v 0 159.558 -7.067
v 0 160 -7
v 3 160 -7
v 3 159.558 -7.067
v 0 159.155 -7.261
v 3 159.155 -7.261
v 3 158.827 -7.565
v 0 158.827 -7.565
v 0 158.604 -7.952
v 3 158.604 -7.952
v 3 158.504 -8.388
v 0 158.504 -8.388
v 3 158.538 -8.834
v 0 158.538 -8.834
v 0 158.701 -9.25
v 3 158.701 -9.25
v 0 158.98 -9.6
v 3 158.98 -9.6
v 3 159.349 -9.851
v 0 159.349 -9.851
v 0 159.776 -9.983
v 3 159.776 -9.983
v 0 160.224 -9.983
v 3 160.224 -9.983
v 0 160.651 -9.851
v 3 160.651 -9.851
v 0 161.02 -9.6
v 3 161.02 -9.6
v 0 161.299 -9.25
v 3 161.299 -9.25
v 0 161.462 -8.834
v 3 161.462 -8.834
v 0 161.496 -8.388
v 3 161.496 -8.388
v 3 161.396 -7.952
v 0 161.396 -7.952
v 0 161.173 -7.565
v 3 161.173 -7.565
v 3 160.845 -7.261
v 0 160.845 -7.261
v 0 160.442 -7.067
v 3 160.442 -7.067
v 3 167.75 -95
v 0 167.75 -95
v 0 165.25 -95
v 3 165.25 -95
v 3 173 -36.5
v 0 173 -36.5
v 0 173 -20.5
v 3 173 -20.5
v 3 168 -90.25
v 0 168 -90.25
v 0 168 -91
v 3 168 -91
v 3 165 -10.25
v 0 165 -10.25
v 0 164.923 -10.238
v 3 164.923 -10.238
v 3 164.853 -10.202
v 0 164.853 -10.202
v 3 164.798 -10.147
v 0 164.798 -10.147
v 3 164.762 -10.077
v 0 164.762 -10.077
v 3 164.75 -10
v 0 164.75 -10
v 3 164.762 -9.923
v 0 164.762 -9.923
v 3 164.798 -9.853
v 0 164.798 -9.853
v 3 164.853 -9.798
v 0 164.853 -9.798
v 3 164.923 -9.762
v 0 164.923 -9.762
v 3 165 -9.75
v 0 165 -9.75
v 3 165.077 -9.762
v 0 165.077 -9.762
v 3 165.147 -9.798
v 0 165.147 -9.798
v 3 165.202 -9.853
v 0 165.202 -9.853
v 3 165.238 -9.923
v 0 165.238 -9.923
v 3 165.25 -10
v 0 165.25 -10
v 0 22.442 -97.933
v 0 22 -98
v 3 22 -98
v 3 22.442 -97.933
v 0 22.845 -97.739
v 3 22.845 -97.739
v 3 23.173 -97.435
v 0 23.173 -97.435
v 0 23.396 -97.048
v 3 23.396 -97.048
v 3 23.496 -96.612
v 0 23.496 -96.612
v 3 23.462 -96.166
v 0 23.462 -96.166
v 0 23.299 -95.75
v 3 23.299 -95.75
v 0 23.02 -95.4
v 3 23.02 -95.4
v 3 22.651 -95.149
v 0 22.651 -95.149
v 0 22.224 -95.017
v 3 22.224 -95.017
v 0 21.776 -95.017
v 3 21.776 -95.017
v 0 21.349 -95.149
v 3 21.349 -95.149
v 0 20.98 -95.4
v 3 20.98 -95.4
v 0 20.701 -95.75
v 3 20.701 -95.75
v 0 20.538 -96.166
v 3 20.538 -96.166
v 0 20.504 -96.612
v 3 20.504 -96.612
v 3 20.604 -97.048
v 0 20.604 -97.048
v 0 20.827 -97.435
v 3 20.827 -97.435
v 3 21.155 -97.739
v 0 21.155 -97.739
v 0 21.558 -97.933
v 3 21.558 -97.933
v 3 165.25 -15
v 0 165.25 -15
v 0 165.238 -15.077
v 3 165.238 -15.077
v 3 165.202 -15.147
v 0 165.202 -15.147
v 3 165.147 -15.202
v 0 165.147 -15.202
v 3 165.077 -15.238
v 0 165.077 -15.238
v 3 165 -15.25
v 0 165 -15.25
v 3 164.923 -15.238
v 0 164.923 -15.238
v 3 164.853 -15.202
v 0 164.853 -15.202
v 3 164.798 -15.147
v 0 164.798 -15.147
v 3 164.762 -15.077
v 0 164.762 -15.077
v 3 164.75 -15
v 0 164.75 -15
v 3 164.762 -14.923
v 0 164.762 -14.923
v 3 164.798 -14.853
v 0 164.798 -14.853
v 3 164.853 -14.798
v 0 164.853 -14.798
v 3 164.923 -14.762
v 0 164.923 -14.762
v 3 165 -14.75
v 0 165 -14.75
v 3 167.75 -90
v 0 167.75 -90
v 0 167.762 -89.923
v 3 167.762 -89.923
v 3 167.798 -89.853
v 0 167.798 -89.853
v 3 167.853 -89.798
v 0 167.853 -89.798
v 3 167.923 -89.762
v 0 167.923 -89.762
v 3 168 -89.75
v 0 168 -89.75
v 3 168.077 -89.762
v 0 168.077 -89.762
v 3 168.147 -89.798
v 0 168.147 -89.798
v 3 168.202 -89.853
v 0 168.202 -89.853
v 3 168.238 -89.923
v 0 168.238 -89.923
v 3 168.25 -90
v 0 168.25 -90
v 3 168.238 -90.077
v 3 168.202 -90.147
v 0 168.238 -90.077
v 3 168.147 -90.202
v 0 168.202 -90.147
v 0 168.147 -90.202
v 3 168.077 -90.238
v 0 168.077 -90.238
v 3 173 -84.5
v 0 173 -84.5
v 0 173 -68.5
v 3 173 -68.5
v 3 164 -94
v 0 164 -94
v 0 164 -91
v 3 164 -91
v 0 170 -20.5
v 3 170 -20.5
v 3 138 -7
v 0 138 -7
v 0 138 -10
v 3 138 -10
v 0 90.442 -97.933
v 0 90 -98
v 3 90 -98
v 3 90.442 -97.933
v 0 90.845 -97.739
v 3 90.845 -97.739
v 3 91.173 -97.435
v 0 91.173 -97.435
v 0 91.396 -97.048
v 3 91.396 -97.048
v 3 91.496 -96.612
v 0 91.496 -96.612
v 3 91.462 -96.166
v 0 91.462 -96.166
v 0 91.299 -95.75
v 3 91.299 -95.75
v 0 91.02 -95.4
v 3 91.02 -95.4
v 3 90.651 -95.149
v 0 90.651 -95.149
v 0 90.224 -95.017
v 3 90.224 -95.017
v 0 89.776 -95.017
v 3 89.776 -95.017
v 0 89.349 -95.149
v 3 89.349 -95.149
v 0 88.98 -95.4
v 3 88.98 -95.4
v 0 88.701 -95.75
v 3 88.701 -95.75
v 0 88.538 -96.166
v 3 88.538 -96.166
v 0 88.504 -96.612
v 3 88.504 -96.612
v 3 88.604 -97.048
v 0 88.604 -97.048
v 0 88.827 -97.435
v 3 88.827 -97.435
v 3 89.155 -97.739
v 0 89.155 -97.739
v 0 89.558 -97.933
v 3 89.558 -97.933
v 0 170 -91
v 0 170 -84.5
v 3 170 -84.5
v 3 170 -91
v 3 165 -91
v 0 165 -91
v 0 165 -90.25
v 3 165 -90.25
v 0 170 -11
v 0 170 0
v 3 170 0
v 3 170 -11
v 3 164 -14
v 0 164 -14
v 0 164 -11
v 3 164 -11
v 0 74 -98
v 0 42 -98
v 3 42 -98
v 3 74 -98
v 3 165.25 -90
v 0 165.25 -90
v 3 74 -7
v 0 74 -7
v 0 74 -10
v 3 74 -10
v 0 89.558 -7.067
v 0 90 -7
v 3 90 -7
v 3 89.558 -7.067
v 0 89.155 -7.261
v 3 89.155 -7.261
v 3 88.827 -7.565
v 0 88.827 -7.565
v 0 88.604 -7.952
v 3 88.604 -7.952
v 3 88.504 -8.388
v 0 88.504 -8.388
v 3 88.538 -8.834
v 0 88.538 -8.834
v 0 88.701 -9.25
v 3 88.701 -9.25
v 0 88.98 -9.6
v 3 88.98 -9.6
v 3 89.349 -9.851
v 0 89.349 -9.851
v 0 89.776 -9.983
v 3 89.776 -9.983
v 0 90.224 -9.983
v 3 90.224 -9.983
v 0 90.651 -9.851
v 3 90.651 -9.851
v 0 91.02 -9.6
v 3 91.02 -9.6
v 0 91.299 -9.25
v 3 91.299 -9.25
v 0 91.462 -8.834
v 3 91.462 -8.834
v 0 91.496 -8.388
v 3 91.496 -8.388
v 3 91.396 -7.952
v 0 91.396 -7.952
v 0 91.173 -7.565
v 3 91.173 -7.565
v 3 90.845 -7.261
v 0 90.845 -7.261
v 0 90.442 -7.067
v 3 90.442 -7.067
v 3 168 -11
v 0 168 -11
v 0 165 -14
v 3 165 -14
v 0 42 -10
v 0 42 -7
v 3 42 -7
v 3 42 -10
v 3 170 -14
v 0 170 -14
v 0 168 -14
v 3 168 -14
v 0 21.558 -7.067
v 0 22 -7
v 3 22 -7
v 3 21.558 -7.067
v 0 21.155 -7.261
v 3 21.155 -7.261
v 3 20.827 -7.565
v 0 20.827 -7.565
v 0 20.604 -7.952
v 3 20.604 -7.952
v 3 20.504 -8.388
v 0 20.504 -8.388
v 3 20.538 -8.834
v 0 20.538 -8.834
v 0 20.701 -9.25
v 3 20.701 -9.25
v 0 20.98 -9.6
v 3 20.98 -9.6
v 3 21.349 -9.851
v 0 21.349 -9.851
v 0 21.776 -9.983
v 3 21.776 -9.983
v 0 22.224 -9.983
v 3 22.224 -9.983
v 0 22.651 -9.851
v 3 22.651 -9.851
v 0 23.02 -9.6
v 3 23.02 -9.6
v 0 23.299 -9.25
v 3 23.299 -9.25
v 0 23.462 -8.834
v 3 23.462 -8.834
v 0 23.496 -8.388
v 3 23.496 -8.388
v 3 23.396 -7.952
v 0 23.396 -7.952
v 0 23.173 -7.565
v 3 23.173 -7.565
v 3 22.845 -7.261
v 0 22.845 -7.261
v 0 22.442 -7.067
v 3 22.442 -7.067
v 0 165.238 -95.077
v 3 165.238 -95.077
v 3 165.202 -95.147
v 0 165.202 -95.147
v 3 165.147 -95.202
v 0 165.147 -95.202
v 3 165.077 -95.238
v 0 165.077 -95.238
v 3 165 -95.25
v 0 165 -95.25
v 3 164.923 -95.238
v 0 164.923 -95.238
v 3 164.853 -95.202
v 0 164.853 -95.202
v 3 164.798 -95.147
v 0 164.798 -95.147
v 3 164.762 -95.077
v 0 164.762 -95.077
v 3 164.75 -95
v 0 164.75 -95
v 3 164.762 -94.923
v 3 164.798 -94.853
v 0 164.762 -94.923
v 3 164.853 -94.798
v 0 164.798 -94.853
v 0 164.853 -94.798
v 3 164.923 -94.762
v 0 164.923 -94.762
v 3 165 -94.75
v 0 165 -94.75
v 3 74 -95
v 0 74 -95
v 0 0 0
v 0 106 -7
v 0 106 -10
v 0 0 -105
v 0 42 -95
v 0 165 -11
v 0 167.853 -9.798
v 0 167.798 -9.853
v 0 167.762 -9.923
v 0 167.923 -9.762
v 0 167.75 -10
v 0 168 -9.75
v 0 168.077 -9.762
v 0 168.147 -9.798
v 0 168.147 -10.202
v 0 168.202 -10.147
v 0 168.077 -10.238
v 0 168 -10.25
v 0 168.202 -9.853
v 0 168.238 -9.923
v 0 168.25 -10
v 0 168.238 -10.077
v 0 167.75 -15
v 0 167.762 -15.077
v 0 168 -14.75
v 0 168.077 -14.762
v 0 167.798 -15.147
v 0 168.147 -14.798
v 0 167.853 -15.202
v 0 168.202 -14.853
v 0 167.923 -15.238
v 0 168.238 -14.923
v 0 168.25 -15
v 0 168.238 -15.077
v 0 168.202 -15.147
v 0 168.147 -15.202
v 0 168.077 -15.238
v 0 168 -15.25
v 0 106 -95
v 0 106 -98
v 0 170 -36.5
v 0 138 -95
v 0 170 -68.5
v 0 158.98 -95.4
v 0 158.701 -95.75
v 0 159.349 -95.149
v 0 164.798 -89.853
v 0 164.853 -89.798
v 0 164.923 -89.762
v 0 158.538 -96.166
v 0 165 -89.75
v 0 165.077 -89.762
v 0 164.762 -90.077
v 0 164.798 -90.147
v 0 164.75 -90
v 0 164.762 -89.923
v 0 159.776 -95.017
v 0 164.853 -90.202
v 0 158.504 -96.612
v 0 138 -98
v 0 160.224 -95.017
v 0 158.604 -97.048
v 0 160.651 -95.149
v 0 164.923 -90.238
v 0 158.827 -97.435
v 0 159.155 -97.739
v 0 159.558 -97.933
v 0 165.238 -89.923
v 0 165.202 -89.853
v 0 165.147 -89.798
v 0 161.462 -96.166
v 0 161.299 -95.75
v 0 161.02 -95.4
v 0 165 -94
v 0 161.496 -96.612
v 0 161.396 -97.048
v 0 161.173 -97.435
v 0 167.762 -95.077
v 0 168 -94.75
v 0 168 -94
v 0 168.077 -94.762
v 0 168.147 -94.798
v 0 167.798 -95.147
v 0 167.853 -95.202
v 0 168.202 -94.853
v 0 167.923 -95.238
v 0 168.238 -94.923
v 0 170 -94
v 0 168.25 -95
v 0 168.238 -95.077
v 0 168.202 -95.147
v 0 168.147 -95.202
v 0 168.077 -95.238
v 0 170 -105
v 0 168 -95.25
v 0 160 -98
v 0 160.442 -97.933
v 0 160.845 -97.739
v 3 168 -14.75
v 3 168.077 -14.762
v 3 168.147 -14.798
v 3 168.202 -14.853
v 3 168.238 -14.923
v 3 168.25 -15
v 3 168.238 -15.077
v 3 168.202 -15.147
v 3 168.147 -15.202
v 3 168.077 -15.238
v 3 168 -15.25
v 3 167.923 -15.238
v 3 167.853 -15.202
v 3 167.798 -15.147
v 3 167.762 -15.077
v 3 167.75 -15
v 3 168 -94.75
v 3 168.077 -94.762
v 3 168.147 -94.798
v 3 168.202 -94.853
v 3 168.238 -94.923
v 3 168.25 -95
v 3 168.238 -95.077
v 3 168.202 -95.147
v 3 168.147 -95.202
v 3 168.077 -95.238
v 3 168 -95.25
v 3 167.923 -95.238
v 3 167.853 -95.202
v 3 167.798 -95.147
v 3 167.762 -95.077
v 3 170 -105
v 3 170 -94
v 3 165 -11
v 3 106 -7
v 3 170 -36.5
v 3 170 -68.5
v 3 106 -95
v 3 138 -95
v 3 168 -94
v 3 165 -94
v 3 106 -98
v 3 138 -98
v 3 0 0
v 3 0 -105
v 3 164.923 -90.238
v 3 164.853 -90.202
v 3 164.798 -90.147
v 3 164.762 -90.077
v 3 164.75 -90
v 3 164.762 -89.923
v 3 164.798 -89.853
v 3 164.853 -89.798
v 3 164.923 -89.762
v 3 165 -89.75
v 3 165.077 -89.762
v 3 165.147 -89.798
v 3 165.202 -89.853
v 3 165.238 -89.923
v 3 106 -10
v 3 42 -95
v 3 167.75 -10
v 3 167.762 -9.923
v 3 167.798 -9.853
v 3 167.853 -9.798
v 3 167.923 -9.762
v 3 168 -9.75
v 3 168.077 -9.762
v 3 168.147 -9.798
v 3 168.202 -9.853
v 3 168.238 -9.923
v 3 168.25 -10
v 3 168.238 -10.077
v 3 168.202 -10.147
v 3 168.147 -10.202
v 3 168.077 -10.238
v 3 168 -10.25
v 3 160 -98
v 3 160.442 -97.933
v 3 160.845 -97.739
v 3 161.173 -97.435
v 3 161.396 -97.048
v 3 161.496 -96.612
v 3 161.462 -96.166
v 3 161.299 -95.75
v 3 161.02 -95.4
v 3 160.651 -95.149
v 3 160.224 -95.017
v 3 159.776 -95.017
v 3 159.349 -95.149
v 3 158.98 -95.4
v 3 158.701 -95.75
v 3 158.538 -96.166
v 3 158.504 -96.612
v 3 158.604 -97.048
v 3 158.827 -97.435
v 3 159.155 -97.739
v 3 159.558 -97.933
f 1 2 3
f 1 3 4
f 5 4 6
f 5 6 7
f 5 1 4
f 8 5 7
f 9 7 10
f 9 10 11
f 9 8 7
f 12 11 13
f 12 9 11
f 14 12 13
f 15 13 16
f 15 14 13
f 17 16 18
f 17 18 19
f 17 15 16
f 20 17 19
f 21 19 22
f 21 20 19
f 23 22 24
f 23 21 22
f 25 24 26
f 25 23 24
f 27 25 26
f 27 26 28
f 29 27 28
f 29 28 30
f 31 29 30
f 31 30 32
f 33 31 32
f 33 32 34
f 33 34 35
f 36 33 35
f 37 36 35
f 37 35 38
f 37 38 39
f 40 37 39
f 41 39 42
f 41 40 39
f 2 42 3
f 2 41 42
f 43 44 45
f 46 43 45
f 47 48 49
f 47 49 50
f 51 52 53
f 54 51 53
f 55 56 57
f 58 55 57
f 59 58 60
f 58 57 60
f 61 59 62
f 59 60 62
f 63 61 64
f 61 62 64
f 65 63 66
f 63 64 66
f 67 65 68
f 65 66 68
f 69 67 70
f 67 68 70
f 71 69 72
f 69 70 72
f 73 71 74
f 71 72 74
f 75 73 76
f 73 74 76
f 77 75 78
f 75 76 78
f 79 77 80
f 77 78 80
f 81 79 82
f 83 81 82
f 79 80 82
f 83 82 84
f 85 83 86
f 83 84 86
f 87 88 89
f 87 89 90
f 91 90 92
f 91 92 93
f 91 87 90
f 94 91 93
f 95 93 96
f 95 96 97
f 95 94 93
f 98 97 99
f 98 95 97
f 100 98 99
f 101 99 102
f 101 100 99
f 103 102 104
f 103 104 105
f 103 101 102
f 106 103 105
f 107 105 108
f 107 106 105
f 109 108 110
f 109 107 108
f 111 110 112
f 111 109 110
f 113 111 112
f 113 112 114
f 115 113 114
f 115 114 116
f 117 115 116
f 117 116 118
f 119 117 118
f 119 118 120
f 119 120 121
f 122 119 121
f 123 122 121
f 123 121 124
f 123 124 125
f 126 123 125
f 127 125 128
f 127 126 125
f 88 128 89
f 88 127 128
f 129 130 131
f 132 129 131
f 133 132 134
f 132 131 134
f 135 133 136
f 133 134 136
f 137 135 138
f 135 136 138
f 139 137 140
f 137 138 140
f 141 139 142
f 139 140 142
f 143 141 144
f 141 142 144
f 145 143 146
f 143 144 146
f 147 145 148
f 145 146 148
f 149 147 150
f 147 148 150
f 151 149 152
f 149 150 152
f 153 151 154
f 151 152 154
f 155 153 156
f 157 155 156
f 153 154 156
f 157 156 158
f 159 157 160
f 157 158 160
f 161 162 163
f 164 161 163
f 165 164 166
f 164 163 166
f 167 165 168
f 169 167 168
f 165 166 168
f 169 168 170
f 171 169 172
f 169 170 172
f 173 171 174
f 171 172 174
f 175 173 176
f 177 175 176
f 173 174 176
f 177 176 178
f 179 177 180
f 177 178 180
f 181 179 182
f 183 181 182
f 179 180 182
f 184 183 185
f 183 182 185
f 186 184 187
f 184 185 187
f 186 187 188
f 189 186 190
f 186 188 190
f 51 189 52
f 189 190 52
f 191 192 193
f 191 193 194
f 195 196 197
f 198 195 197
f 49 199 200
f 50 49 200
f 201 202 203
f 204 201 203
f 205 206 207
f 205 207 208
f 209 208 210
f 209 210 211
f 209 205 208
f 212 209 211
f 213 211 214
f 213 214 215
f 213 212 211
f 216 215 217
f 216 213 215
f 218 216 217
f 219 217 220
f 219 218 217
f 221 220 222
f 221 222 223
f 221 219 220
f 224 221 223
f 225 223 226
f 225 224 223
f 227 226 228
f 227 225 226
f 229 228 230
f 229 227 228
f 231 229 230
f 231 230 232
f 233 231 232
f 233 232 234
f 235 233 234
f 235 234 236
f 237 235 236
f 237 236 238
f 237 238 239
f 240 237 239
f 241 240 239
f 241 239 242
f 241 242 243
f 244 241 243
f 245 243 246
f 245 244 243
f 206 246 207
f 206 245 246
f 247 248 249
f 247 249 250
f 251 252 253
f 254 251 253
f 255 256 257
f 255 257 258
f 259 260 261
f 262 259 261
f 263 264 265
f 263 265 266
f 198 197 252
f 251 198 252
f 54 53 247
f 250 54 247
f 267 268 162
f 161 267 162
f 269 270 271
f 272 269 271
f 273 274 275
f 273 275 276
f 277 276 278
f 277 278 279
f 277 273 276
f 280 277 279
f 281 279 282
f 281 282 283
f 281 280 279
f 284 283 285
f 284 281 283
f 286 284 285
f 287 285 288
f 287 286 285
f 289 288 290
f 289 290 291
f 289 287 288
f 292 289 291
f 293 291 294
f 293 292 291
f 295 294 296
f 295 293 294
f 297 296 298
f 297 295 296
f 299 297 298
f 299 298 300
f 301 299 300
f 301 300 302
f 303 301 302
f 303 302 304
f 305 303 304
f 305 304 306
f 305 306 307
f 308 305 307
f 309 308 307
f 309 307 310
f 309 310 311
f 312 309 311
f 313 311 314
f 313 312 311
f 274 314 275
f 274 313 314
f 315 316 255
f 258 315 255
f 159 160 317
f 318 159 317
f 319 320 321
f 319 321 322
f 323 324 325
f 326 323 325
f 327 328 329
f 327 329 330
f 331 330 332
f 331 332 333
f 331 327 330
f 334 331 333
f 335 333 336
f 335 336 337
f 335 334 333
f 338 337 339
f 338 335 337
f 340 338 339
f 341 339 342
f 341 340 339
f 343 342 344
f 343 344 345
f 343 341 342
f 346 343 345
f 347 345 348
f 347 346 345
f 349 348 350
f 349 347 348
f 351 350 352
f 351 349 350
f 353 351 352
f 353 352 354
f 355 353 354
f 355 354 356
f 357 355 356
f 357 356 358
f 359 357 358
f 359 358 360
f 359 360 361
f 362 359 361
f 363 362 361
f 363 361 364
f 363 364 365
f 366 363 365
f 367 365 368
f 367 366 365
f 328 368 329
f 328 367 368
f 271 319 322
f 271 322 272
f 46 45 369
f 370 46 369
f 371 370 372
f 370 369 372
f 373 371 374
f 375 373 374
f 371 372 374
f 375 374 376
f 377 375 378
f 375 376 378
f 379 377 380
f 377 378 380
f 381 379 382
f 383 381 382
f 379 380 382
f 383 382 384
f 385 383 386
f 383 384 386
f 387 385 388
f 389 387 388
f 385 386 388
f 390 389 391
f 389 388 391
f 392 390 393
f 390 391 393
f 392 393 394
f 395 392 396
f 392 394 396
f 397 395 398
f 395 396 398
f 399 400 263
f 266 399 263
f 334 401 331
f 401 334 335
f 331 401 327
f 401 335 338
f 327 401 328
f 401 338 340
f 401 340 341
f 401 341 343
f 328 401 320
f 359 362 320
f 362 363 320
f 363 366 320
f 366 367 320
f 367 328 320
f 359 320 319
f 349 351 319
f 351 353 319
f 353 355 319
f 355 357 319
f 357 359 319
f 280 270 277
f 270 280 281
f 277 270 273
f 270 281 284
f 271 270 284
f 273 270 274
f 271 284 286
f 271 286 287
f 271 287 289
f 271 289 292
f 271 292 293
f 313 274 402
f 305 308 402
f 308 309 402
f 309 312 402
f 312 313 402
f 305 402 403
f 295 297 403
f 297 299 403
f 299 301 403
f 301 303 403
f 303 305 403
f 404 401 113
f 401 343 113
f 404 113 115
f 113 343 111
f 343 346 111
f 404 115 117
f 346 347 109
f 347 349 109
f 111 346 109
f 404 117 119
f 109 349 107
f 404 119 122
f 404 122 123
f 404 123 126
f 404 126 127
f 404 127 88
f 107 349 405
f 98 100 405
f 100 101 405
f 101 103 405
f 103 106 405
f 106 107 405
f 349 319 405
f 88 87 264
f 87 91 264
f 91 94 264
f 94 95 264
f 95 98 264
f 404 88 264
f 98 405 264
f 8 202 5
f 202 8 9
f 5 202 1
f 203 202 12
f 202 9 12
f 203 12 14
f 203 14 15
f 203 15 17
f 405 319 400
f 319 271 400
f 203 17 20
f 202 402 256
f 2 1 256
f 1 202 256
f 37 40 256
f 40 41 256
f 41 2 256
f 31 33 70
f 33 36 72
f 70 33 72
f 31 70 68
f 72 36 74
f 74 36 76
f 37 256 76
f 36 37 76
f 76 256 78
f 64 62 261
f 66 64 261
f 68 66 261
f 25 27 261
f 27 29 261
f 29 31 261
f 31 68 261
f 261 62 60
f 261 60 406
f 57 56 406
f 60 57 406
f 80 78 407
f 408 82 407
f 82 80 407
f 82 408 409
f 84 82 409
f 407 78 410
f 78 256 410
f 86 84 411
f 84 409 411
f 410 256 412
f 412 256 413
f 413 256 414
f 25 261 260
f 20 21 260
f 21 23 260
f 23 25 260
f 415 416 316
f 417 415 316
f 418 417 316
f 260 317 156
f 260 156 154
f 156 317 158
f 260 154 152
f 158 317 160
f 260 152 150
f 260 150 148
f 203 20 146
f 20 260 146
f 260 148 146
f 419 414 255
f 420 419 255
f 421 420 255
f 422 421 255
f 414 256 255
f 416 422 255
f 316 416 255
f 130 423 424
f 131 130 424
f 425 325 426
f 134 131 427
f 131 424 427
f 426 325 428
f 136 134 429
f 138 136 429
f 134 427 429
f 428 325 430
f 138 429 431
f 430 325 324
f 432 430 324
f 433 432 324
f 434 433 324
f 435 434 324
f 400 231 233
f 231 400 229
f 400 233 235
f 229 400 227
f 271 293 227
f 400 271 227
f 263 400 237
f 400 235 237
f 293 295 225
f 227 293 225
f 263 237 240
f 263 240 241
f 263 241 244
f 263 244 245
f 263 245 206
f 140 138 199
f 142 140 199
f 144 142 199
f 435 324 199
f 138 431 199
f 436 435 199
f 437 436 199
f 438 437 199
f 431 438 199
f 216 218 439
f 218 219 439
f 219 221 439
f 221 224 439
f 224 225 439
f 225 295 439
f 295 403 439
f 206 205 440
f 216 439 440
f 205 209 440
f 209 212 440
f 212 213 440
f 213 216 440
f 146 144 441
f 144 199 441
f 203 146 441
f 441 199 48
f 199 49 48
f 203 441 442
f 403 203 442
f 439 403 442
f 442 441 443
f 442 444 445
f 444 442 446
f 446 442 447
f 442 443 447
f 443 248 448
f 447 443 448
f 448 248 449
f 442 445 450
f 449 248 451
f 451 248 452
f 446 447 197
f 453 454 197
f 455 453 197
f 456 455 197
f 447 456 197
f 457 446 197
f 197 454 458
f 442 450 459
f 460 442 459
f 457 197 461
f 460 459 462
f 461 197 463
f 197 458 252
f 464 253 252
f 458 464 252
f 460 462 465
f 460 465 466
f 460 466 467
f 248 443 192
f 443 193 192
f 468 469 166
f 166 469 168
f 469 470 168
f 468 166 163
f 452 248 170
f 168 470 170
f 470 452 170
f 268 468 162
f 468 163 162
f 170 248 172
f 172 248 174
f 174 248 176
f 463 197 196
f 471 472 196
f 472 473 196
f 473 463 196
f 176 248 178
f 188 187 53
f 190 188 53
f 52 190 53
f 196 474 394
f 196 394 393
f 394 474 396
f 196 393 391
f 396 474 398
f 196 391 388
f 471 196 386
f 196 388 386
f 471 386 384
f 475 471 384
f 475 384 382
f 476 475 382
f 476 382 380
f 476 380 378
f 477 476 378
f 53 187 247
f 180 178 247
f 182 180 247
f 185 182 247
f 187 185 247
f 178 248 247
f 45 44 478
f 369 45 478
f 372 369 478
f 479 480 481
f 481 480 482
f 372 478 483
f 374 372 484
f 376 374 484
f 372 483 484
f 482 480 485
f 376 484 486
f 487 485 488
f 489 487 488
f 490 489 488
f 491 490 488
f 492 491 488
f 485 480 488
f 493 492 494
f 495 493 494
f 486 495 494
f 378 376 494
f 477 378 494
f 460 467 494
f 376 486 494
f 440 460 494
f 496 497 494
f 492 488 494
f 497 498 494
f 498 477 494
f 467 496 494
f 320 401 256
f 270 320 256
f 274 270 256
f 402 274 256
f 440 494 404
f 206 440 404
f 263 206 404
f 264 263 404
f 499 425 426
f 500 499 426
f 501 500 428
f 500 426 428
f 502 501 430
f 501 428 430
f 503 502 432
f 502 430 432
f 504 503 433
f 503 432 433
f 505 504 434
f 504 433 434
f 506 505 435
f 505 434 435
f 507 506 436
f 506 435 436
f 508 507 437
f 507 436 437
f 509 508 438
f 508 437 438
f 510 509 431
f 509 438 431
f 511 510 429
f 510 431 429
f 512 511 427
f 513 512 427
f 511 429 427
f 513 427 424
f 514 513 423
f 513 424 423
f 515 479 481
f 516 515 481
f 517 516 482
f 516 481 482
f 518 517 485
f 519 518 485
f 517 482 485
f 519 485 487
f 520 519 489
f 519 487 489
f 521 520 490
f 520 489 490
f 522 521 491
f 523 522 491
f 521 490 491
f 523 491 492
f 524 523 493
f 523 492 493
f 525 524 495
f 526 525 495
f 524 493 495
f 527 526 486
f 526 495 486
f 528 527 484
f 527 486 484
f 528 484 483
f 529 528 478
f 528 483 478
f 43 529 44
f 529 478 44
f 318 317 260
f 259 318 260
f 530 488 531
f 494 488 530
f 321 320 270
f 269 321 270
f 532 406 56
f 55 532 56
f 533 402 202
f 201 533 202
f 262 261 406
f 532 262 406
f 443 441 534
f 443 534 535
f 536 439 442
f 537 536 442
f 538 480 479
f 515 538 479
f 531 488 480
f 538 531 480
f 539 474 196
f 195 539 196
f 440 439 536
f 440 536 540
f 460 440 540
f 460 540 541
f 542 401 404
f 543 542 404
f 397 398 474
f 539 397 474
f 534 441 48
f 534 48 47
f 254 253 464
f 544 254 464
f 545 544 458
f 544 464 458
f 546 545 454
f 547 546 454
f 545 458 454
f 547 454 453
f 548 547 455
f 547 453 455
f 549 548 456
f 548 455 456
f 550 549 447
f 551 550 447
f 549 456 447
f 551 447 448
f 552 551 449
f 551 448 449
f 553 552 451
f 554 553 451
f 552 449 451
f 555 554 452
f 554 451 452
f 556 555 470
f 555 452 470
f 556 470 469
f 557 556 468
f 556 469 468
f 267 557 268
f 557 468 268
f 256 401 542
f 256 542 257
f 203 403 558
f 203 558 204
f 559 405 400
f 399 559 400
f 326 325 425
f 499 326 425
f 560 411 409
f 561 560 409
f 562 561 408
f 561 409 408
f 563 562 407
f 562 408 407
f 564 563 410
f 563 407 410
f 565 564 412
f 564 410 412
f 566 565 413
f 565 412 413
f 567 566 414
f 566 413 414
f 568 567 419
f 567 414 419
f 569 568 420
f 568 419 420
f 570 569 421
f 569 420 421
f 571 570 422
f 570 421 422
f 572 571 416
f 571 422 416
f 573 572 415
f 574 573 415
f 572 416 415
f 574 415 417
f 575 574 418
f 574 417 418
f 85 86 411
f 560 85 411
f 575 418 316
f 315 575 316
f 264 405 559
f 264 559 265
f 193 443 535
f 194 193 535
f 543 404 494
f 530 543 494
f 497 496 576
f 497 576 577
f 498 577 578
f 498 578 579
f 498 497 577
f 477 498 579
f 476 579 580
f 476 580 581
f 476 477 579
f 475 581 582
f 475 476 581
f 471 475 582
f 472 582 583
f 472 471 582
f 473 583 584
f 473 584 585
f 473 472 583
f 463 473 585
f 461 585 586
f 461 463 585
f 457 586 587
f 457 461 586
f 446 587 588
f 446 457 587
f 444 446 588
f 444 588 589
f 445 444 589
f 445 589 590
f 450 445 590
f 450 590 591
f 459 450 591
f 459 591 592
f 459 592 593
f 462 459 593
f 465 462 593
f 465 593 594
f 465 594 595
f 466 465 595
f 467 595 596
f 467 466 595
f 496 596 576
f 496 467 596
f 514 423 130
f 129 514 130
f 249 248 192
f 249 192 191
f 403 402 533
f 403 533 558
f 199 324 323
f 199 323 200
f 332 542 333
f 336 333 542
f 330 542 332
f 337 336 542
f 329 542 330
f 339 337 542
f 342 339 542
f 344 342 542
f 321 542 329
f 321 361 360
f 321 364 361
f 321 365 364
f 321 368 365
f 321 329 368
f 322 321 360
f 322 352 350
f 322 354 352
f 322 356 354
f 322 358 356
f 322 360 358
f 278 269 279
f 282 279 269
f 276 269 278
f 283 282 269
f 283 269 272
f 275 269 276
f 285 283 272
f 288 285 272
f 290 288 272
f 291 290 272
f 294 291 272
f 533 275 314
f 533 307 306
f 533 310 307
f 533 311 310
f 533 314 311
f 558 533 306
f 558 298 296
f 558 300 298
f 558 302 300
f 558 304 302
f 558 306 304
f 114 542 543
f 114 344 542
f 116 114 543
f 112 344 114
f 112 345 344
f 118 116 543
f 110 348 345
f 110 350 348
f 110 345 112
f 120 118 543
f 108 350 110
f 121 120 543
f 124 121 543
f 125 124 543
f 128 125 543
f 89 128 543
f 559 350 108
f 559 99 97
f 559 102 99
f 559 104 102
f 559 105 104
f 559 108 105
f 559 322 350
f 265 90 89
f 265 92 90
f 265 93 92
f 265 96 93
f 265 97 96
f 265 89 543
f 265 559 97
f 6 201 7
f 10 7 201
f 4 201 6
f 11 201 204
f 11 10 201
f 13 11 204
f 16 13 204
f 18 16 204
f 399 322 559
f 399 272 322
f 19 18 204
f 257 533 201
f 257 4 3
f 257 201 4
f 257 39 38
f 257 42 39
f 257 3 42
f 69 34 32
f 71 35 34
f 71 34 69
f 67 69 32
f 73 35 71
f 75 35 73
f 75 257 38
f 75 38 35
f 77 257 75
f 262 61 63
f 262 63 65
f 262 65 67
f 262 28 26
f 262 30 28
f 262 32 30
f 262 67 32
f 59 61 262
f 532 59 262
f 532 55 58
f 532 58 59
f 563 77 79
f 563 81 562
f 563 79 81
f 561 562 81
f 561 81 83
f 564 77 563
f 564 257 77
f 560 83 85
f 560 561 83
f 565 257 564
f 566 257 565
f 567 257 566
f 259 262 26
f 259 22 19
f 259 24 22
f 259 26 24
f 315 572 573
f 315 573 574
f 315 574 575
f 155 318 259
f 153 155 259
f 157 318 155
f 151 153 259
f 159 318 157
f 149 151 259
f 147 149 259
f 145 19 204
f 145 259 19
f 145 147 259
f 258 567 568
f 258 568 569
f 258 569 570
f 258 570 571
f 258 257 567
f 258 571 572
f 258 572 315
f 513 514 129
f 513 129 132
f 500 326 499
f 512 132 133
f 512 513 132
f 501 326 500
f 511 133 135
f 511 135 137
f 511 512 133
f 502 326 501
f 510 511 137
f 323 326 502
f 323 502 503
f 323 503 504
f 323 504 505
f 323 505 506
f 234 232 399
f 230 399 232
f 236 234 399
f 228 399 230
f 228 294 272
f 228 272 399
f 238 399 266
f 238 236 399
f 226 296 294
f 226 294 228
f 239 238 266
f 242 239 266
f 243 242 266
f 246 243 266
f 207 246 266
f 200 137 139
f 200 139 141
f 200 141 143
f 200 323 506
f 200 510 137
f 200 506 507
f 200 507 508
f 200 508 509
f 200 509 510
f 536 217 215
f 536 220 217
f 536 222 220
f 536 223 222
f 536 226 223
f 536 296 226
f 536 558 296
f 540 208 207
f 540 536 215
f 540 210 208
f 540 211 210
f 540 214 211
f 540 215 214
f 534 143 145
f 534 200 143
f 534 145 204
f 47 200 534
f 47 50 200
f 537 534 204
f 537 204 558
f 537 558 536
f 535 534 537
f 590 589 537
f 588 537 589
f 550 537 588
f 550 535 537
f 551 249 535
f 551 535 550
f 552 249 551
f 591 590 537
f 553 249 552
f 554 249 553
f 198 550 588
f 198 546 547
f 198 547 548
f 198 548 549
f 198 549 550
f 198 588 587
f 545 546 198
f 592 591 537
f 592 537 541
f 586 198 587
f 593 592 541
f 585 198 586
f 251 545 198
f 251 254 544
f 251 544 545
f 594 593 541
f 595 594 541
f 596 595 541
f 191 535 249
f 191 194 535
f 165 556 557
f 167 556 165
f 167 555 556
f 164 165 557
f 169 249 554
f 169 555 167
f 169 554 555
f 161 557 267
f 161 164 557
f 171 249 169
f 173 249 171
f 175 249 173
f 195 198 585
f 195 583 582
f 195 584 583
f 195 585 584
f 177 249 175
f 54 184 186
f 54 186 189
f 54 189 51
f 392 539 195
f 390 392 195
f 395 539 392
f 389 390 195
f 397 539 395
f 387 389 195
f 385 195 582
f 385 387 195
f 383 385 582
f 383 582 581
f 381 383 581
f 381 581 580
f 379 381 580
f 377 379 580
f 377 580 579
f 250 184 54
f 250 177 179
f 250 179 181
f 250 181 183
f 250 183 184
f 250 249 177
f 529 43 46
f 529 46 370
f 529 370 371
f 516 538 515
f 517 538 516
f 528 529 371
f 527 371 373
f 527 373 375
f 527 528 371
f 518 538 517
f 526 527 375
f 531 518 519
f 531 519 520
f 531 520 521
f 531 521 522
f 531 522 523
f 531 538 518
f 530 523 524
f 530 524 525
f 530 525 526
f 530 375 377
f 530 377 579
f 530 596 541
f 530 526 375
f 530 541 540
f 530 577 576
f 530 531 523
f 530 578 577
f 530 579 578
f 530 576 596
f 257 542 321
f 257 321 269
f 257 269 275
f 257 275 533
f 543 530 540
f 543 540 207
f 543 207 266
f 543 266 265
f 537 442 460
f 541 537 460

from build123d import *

# Parameters (mm, degrees)
CROQUIS1_W              = 105
CROQUIS1_H              = 170
CROQUIS1_R              = 1.5
CROQUIS1_W_2            = 3
CROQUIS1_H_2            = 32
SALIENTE_EXTRUIR1_DEPTH = 3
CROQUIS2_W              = 3
CROQUIS2_H              = 16
SALIENTE_EXTRUIR2_DEPTH = 3
CORTAR_EXTRUIR1_DEPTH   = 3


with BuildPart() as part:
    # Croquis1 → Saliente-Extruir1 (new body)
    with BuildSketch(Plane(origin=(0, 0, 0), x_dir=(0, 0, -1), z_dir=(1, 0, 0))):
        with Locations((52.5, 85)):
            Rectangle(CROQUIS1_W, CROQUIS1_H)
        with Locations((96.5, 160)):
            Circle(CROQUIS1_R, mode=Mode.SUBTRACT)
        with Locations((96.5, 22)):
            Circle(CROQUIS1_R, mode=Mode.SUBTRACT)
        with Locations((96.5, 90)):
            Circle(CROQUIS1_R, mode=Mode.SUBTRACT)
        with Locations(Location((8.5, 22, 0), (0, 0, 180))):
            Circle(CROQUIS1_R, mode=Mode.SUBTRACT)
        with Locations(Location((8.5, 90, 0), (0, 0, 180))):
            Circle(CROQUIS1_R, mode=Mode.SUBTRACT)
        with Locations(Location((8.5, 160, 0), (0, 0, 180))):
            Circle(CROQUIS1_R, mode=Mode.SUBTRACT)
        with Locations((96.5, 58)):
            Rectangle(CROQUIS1_W_2, CROQUIS1_H_2, mode=Mode.SUBTRACT)
        with Locations((96.5, 122)):
            Rectangle(CROQUIS1_W_2, CROQUIS1_H_2, mode=Mode.SUBTRACT)
        with Locations((8.5, 58)):
            Rectangle(CROQUIS1_W_2, CROQUIS1_H_2, mode=Mode.SUBTRACT)
        with Locations((8.5, 122)):
            Rectangle(CROQUIS1_W_2, CROQUIS1_H_2, mode=Mode.SUBTRACT)
    extrude(amount=SALIENTE_EXTRUIR1_DEPTH)

    # Croquis2 → Saliente-Extruir2 (add)
    with BuildSketch(Plane(origin=(0, 170, 0), x_dir=(1, 0, 0), z_dir=(0, 1, 0))):
        with Locations((1.5, 76.5)):
            Rectangle(CROQUIS2_W, CROQUIS2_H)
        with Locations((1.5, 28.5)):
            Rectangle(CROQUIS2_W, CROQUIS2_H)
    extrude(amount=SALIENTE_EXTRUIR2_DEPTH)

    # Croquis3 → Cortar-Extruir1 (cut)
    with BuildSketch(Plane.ZY):
        with BuildLine():
            Line((-11, 168), (-11, 170))
            Line((-11, 170), (-14, 170))
            Line((-14, 170), (-14, 168))
            Line((-14, 168), (-14.75, 168))
            ThreePointArc((-14.75, 168), (-15.176776695, 168.176776695), (-15, 167.75))
            Line((-15, 167.75), (-15, 165.25))
            ThreePointArc((-15, 165.25), (-15.176776695, 164.823223305), (-14.75, 165))
            Line((-14.75, 165), (-14, 165))
            Line((-14, 165), (-14, 164))
            Line((-14, 164), (-11, 164))
            Line((-11, 164), (-11, 165))
            Line((-11, 165), (-10.25, 165))
            ThreePointArc((-10.25, 165), (-9.823223305, 164.823223305), (-10, 165.25))
            Line((-10, 165.25), (-10, 167.75))
            ThreePointArc((-10, 167.75), (-9.823223305, 168.176776695), (-10.25, 168))
            Line((-10.25, 168), (-11, 168))
        make_face()
        with BuildLine():
            Line((-91, 168), (-91, 170))
            Line((-91, 170), (-94, 170))
            Line((-94, 170), (-94, 168))
            Line((-94, 168), (-94.75, 168))
            ThreePointArc((-94.75, 168), (-95.176776695, 168.176776695), (-95, 167.75))
            Line((-95, 167.75), (-95, 165.25))
            ThreePointArc((-95, 165.25), (-95.176776695, 164.823223305), (-94.75, 165))
            Line((-94.75, 165), (-94, 165))
            Line((-94, 165), (-94, 164))
            Line((-94, 164), (-91, 164))
            Line((-91, 164), (-91, 165))
            Line((-91, 165), (-90.25, 165))
            ThreePointArc((-90.25, 165), (-89.823223305, 164.823223305), (-90, 165.25))
            Line((-90, 165.25), (-90, 167.75))
            ThreePointArc((-90, 167.75), (-89.823223305, 168.176776695), (-90.25, 168))
            Line((-90.25, 168), (-91, 168))
        make_face()
    extrude(amount=-CORTAR_EXTRUIR1_DEPTH, mode=Mode.SUBTRACT)


solid = part.part
